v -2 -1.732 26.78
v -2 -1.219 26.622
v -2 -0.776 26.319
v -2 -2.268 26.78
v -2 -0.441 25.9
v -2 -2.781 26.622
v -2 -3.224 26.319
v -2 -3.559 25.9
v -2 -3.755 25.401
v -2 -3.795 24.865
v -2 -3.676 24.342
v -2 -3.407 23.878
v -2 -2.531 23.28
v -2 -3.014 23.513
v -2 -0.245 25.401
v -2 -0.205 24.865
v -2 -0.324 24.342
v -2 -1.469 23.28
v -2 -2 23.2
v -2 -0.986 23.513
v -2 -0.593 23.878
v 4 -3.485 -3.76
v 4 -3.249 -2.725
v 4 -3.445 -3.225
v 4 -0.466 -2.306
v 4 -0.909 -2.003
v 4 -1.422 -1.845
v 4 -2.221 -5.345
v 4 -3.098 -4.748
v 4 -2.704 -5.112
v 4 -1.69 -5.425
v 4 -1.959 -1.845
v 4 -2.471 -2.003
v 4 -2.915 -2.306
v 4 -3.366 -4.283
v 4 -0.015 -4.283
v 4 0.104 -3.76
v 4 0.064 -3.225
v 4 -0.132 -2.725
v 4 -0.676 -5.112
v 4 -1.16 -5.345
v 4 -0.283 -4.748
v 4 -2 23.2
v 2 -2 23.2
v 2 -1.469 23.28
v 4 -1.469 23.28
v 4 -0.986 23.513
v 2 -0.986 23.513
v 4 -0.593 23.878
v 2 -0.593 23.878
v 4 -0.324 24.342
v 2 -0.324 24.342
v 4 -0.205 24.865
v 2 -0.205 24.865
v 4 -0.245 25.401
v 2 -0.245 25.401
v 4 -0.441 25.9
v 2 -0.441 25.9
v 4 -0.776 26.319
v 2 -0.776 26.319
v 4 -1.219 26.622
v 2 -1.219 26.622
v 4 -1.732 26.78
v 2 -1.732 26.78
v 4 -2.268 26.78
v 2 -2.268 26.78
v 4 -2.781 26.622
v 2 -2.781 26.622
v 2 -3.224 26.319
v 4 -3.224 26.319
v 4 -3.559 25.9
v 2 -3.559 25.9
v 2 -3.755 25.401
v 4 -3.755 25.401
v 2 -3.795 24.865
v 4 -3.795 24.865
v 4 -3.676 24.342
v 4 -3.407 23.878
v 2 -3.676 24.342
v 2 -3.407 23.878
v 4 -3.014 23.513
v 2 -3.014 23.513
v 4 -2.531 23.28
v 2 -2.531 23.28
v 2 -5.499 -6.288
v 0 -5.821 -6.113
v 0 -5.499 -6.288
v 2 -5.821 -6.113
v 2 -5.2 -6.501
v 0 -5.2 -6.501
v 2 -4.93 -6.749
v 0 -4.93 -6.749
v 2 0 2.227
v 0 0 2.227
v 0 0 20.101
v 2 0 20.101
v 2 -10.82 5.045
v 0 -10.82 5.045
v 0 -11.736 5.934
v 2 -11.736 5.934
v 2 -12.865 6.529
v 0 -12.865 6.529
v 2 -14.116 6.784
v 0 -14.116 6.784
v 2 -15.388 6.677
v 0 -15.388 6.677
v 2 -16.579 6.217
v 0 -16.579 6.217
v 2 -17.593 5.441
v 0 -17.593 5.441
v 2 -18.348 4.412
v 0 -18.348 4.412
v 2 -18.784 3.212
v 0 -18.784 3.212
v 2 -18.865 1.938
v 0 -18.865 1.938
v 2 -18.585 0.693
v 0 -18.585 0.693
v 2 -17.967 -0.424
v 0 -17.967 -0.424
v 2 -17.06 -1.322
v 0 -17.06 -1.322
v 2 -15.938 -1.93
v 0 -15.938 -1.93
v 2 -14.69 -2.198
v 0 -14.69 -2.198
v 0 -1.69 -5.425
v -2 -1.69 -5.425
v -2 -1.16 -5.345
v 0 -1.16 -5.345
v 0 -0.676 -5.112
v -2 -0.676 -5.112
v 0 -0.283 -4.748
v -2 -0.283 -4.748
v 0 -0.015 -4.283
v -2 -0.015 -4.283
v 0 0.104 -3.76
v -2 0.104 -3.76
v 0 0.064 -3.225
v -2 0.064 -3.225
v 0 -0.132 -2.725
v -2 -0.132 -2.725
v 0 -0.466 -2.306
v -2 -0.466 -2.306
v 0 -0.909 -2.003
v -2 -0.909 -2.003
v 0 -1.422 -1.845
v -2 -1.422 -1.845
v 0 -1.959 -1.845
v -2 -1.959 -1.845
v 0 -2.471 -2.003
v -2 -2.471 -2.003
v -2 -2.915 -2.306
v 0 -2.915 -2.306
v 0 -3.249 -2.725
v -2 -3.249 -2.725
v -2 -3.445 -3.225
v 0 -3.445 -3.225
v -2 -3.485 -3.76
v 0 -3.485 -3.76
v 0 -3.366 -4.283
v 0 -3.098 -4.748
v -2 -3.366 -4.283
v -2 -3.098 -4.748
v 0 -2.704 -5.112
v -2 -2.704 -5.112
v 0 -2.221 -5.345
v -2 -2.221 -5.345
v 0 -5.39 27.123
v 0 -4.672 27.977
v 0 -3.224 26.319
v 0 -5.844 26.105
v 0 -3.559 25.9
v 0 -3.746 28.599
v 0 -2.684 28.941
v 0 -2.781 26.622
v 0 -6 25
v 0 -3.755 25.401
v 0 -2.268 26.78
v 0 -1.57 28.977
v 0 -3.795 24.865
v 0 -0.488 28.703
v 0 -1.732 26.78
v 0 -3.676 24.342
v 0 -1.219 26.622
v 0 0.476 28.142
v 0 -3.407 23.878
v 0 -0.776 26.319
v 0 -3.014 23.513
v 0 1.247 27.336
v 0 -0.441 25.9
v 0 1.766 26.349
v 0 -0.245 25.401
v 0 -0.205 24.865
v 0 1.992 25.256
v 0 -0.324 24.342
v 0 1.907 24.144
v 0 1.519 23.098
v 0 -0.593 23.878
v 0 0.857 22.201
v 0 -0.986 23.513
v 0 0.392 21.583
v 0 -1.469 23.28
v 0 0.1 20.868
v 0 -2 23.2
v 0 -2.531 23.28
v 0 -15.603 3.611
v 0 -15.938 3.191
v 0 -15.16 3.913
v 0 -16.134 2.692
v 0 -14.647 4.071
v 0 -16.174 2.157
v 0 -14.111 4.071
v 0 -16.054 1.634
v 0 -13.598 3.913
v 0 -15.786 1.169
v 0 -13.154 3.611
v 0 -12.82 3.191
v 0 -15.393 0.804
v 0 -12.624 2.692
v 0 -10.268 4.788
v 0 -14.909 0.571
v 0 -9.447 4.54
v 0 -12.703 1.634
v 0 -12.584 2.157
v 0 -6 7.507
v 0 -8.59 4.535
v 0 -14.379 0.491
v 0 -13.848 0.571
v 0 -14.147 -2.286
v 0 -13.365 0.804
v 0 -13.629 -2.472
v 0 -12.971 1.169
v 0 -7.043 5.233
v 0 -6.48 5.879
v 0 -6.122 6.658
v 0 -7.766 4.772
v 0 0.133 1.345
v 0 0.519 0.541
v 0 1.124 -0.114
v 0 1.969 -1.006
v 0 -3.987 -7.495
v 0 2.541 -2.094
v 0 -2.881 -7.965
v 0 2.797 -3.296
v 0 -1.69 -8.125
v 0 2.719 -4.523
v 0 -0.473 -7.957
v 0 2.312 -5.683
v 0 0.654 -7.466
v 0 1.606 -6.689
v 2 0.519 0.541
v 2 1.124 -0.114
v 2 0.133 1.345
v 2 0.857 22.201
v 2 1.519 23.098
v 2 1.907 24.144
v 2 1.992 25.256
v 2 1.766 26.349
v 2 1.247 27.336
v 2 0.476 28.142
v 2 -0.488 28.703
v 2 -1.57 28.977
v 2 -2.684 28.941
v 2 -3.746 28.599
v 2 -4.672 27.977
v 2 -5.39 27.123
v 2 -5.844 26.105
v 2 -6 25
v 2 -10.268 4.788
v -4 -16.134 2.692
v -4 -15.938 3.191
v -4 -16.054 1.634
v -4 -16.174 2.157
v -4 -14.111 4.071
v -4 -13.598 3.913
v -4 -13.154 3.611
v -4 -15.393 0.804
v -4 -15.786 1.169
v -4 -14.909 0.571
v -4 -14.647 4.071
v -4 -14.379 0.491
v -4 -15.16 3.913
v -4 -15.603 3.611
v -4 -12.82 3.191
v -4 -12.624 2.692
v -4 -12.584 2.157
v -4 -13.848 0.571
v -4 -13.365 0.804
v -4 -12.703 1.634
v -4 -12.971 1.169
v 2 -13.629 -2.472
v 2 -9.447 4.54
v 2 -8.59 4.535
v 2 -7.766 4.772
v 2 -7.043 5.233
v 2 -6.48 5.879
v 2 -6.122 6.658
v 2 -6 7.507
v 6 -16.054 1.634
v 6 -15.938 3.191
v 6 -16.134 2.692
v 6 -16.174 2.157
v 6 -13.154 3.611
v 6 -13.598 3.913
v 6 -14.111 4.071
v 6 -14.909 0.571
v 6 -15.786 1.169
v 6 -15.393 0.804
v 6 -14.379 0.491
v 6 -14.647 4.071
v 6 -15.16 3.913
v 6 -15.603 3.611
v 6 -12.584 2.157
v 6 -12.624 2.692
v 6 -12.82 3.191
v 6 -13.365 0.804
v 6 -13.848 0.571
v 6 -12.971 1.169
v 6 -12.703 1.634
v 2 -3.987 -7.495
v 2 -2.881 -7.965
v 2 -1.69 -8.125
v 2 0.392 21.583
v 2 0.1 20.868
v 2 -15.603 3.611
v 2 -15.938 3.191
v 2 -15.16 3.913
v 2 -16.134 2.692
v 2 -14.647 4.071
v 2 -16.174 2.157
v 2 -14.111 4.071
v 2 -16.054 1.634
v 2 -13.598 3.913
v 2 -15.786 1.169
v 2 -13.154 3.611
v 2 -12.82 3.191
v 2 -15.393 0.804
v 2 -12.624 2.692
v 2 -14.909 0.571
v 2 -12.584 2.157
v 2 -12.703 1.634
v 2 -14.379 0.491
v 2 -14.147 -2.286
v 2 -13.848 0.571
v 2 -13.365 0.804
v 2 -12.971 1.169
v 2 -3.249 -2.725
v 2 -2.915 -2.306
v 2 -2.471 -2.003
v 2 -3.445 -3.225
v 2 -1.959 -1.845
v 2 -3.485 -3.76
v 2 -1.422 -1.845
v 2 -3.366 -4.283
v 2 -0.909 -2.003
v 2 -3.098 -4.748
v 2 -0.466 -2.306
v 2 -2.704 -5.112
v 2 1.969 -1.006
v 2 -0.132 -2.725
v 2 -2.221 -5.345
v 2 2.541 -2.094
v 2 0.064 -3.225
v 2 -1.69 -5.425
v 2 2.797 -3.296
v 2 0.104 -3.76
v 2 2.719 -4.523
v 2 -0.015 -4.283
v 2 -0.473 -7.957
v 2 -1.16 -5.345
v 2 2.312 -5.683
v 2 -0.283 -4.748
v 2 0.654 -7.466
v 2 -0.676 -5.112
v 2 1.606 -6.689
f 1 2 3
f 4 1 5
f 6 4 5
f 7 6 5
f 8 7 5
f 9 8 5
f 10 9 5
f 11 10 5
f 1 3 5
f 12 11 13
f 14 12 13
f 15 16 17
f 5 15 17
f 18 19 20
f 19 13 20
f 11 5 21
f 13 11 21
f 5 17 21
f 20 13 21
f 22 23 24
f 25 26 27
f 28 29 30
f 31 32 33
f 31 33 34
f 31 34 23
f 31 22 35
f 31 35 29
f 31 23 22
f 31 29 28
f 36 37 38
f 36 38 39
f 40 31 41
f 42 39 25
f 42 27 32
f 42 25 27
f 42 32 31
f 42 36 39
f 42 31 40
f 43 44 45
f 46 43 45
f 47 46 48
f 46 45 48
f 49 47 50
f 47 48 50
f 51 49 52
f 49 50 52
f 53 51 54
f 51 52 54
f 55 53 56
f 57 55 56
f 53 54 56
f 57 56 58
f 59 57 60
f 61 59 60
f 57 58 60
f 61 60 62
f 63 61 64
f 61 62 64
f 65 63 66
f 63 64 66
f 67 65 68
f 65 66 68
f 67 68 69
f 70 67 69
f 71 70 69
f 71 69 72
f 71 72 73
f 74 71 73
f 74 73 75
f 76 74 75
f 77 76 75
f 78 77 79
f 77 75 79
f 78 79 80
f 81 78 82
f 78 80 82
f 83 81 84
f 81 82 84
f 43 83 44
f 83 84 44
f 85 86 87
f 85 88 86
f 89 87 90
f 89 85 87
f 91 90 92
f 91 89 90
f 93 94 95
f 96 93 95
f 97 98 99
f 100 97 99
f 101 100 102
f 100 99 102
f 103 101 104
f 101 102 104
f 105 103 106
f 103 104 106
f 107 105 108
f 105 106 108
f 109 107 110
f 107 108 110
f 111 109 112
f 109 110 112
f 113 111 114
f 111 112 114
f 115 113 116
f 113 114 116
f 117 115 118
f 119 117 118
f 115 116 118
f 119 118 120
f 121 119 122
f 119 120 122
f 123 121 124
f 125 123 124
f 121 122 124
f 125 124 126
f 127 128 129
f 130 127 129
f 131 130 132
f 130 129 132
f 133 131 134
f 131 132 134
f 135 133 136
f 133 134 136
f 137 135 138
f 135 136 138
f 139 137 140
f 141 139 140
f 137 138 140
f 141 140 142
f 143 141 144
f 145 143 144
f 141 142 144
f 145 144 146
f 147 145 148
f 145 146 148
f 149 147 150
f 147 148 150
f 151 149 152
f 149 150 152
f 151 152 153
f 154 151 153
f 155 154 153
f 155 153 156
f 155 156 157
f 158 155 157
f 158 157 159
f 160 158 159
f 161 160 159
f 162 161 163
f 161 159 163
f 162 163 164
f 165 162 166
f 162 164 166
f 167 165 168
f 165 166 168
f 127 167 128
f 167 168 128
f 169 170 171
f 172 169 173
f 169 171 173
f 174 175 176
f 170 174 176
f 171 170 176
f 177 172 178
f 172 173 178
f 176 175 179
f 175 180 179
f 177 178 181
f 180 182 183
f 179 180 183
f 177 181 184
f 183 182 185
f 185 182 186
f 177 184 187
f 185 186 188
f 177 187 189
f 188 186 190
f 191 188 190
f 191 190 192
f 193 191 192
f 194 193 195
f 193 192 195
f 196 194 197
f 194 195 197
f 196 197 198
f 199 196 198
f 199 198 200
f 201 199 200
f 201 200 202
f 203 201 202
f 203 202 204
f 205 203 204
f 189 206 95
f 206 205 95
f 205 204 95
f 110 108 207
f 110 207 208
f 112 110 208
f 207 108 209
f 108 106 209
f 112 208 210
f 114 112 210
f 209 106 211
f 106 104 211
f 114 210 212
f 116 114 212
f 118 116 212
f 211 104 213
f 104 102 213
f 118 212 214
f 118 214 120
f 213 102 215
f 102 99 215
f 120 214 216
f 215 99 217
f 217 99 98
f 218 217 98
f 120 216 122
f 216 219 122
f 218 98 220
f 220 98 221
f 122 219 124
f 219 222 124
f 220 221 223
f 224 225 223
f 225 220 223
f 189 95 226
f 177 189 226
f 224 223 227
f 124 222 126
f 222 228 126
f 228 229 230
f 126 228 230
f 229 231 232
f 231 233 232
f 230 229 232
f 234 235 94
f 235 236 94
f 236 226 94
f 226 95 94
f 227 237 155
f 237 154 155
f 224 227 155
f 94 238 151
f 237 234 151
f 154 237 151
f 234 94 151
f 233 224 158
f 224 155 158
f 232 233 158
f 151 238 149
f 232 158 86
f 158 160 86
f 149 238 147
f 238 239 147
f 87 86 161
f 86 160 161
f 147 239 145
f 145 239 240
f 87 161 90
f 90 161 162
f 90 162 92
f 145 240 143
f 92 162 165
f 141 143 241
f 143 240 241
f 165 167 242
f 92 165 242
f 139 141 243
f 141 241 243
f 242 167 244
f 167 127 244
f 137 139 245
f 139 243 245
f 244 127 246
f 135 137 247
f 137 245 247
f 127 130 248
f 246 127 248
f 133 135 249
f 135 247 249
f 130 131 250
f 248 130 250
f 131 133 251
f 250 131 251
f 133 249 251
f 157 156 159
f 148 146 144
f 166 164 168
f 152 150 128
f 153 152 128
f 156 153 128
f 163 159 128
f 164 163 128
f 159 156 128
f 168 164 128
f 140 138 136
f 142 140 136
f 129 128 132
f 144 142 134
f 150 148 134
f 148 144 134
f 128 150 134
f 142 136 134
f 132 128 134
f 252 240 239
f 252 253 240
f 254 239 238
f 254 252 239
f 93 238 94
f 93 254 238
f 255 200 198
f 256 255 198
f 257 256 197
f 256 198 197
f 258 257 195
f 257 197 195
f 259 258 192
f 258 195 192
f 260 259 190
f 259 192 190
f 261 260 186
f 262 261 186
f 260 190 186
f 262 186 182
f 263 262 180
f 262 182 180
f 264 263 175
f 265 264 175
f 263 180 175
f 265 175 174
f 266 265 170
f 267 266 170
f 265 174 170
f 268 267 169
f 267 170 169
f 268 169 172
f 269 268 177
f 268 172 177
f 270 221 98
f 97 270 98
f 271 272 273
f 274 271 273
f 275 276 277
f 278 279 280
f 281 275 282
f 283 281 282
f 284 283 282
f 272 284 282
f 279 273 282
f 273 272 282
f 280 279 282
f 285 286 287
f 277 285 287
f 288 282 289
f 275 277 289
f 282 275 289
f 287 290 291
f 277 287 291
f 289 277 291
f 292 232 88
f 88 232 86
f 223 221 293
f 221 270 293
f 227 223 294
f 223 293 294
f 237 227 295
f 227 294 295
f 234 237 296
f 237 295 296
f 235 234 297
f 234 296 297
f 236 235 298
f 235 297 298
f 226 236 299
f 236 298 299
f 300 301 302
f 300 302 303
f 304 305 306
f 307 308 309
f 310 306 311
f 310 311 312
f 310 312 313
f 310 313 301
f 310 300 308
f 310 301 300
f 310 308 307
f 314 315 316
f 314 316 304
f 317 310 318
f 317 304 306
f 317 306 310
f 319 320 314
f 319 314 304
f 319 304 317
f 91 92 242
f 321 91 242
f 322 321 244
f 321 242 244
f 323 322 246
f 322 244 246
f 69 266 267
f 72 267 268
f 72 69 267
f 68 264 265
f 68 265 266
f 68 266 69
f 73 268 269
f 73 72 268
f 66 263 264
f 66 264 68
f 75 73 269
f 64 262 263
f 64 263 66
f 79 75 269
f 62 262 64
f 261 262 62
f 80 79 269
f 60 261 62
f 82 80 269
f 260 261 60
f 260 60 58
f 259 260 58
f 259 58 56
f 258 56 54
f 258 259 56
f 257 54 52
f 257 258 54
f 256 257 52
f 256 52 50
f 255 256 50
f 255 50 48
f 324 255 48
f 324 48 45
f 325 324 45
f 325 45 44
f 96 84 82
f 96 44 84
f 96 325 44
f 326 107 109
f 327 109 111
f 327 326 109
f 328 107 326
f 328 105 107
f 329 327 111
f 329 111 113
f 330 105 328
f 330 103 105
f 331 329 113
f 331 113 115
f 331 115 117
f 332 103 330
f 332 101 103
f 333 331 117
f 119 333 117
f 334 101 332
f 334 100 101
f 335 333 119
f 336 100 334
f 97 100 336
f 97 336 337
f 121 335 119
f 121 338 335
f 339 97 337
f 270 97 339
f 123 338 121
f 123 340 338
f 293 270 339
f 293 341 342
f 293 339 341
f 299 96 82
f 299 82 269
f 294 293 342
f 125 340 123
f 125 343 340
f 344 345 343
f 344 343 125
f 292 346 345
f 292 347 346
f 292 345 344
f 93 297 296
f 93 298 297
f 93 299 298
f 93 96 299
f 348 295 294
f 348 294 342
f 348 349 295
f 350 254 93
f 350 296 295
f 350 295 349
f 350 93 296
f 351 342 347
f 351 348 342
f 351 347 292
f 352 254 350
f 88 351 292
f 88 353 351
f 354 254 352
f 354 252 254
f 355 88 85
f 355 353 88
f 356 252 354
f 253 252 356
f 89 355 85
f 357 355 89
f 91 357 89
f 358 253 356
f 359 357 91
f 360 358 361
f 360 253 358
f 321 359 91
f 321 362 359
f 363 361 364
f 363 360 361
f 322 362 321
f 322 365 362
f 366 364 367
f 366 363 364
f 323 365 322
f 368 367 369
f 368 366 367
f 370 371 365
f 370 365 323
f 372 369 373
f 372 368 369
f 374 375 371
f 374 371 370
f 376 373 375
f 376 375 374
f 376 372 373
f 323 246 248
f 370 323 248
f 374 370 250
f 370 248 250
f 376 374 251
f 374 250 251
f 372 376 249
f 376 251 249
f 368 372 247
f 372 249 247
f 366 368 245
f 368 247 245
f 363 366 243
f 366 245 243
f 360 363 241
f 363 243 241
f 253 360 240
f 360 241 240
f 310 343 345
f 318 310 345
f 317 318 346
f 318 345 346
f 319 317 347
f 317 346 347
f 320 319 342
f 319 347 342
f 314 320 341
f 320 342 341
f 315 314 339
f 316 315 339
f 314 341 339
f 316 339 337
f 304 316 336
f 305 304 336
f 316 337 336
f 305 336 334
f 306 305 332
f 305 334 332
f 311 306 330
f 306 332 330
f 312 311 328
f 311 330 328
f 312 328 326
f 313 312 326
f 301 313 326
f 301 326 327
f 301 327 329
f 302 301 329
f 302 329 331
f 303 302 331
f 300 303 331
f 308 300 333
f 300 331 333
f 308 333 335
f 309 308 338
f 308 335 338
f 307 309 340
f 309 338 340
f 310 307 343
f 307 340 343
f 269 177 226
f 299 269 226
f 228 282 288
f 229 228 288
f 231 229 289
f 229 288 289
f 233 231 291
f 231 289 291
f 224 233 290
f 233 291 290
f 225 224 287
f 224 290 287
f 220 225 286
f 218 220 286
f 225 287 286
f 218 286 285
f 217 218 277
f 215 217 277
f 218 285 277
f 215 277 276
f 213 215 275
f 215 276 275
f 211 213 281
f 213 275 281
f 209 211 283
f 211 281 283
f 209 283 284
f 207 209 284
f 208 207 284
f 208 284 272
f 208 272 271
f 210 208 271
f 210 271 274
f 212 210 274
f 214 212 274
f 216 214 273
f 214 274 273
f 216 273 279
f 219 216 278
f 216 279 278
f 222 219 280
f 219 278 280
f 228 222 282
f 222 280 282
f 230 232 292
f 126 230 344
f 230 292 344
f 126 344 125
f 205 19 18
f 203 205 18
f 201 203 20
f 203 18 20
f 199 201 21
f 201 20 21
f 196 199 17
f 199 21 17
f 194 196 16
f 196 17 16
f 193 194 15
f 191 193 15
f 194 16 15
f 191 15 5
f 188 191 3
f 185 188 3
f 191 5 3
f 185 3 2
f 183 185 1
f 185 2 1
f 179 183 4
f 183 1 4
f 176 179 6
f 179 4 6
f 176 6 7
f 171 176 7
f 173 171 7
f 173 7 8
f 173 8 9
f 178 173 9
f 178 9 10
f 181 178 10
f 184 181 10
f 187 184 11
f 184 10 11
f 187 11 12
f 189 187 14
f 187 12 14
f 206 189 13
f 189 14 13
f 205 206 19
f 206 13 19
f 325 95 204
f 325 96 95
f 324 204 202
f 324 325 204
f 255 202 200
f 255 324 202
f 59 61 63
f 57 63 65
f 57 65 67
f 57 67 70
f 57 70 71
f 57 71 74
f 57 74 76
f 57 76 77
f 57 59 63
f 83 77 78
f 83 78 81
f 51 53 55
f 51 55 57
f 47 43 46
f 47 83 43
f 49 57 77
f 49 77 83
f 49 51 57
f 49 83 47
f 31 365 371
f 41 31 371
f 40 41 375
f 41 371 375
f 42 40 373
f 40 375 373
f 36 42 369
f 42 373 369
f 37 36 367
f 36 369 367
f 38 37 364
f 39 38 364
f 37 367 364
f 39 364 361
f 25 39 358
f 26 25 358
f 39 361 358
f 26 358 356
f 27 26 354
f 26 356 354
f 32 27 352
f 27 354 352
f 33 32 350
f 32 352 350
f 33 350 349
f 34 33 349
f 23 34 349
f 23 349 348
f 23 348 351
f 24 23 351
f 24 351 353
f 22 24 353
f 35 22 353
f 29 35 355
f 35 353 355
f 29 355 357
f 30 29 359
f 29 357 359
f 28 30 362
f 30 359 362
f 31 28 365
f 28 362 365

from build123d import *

# Parameters (mm, degrees)
EXTRUDE_1_DEPTH     = 2
SKETCH_1_3_R        = 2
CUT_EXTRUDE_1_DEPTH = 35.66133887
FILLET_1_R          = 3
EXTRUDE_START       = -2
SKETCH_2_R          = 2
EXTRUDE_2_DEPTH     = 2
SKETCH_2_5_R        = 1.8
EXTRUDE_5_DEPTH     = 2
EXTRUDE_START_2     = -4
SKETCH_2_6_R        = 1.8
EXTRUDE_6_DEPTH     = 2
SKETCH_2_7_R        = 1.8
EXTRUDE_7_DEPTH     = 4
EXTRUDE_START_3     = -6
SKETCH_2_8_R        = 1.8
EXTRUDE_8_DEPTH     = 4


with BuildPart() as part:
    # 草图1 → 凸台-拉伸1 (new body)
    with BuildSketch(Plane(origin=(0, 0, 0), x_dir=(0, 0, -1), z_dir=(1, 0, 0))):
        with BuildLine():
            Line((-25, -6), (-25, 0))
            Line((-25, 0), (-21.535898385, 0))
            ThreePointArc((-21.535898385, 0), (-28.464101615, 0), (-25, -6))
        make_face()
        with BuildLine():
            Line((-21.535898385, 0), (-25, 0))
            Line((-25, 0), (-25, -6))
            ThreePointArc((-25, -6), (-22.171572875, -4.828427125), (-21, -2))
            ThreePointArc((-21, -2), (-21.136296695, -0.96472382), (-21.535898385, 0))
        make_face()
        with BuildLine():
            Line((-0.545176611, 0), (-21.535898385, 0))
            ThreePointArc((-21.535898385, 0), (-21.136296695, -0.96472382), (-21, -2))
            ThreePointArc((-21, -2), (-22.171572875, -4.828427125), (-25, -6))
            Line((-25, -6), (-2.797845949, -6))
            Line((-2.797845949, -6), (-0.871249866, -1.868401368))
            ThreePointArc((-0.871249866, -1.868401368), (-0.807766841, -0.916826597), (-0.545176611, 0))
        make_face()
        with BuildLine():
            ThreePointArc((8.125231148, -1.690473047), (4.486383017, 2.726360373), (-0.545176611, 0))
            Line((-0.545176611, 0), (0, 0))
            Line((0, 0), (7.250462296, -3.380946094))
            Line((7.250462296, -3.380946094), (6.37921243, -5.249347462))
            ThreePointArc((6.37921243, -5.249347462), (7.66521356, -3.67252807), (8.125231148, -1.690473047))
        make_face()
        with BuildLine():
            Line((0, 0), (-0.545176611, 0))
            ThreePointArc((-0.545176611, 0), (-0.807766841, -0.916826597), (-0.871249866, -1.868401368))
            Line((-0.871249866, -1.868401368), (0, 0))
        make_face()
        with BuildLine():
            Line((-0.871249866, -1.868401368), (-2.797845949, -6))
            Line((-2.797845949, -6), (0, -6))
            Line((0, -6), (0, -4.356499889))
            ThreePointArc((0, -4.356499889), (-0.621910323, -3.177681615), (-0.871249866, -1.868401368))
        make_face()
        with BuildLine():
            Line((0, -6), (-2.797845949, -6))
            Line((-2.797845949, -6), (-5.045405798, -10.819907651))
            ThreePointArc((-5.045405798, -10.819907651), (-0.389642338, -10.300397024), (2.205056498, -14.200853745))
            Line((2.205056498, -14.200853745), (6.37921243, -5.249347462))
            ThreePointArc((6.37921243, -5.249347462), (3.001481776, -6.147034134), (0, -4.356499889))
            Line((0, -4.356499889), (0, -6))
        make_face()
        with BuildLine():
            Line((7.250462296, -3.380946094), (0, 0))
            Line((0, 0), (0, -4.356499889))
            ThreePointArc((0, -4.356499889), (3.001481776, -6.147034134), (6.37921243, -5.249347462))
            Line((6.37921243, -5.249347462), (7.250462296, -3.380946094))
        make_face()
        with BuildLine():
            Line((0, -4.356499889), (0, 0))
            Line((0, 0), (-0.871249866, -1.868401368))
            ThreePointArc((-0.871249866, -1.868401368), (-0.621910323, -3.177681615), (0, -4.356499889))
        make_face()
        with BuildLine():
            ThreePointArc((2.205056498, -14.200853745), (-0.389642338, -10.300397024), (-5.045405798, -10.819907651))
            Line((-5.045405798, -10.819907651), (-5.916655664, -12.688309019))
            Line((-5.916655664, -12.688309019), (1.333806632, -16.069255112))
            Line((1.333806632, -16.069255112), (2.205056498, -14.200853745))
        make_face()
        with BuildLine():
            Line((-5.916655664, -12.688309019), (-5.045405798, -10.819907651))
            ThreePointArc((-5.045405798, -10.819907651), (-4.27347954, -18.418764477), (2.208575484, -14.378782065))
            ThreePointArc((2.208575484, -14.378782065), (2.207695651, -14.289800508), (2.205056498, -14.200853745))
            Line((2.205056498, -14.200853745), (1.333806632, -16.069255112))
            Line((1.333806632, -16.069255112), (-5.916655664, -12.688309019))
        make_face()
    extrude(amount=EXTRUDE_1_DEPTH)

    # 草图1<3> → 切除-拉伸1 (cut, through all)
    with BuildSketch(Plane(origin=(0, 0, 0), x_dir=(0, 0, -1), z_dir=(1, 0, 0))):
        with Locations((-25, -2)):
            Circle(SKETCH_1_3_R)
        with Locations((3.625231148, -1.690473047)):
            Circle(SKETCH_1_3_R)
        with Locations((-2.291424516, -14.378782065)):
            Circle(SKETCH_1_3_R)
    extrude(amount=CUT_EXTRUDE_1_DEPTH, mode=Mode.SUBTRACT)

    # 圆角1
    fillet_1_edges = [part.edges().sort_by_distance(p)[0] for p in [
        (1, -6, 2.797845949),
        (1, 0, 0.545176611),
        (1, -5.249347462, -6.37921243),
        (1, -14.200853745, -2.205056498),
        (1, 0, 21.535898385),
    ]]
    fillet(fillet_1_edges, radius=FILLET_1_R)

    # 草图2 → 凸台-拉伸2 (add)
    with BuildSketch(Plane(origin=(2, 0, 0), x_dir=(0, 0, -1), z_dir=(1, 0, 0)).offset(EXTRUDE_START)):
        with Locations((3.625231148, -1.690473047)):
            Circle(SKETCH_2_R)
        with Locations((-2.291424516, -14.378782065)):
            Circle(SKETCH_2_R)
        with Locations((-25, -2)):
            Circle(SKETCH_2_R)
    extrude(amount=EXTRUDE_2_DEPTH)

    # 草图2<5> → 凸台-拉伸5 (add)
    with BuildSketch(Plane(origin=(2, 0, 0), x_dir=(0, 0, -1), z_dir=(1, 0, 0))):
        with Locations((-25, -2)):
            Circle(SKETCH_2_5_R)
        with Locations((3.625231148, -1.690473047)):
            Circle(SKETCH_2_5_R)
    extrude(amount=EXTRUDE_5_DEPTH)

    # 草图2<6> → 凸台-拉伸6 (add)
    with BuildSketch(Plane(origin=(2, 0, 0), x_dir=(0, 0, -1), z_dir=(1, 0, 0)).offset(EXTRUDE_START_2)):
        with Locations((-25, -2)):
            Circle(SKETCH_2_6_R)
        with Locations((3.625231148, -1.690473047)):
            Circle(SKETCH_2_6_R)
    extrude(amount=EXTRUDE_6_DEPTH)

    # 草图2<7> → 凸台-拉伸7 (add)
    with BuildSketch(Plane(origin=(2, 0, 0), x_dir=(0, 0, -1), z_dir=(1, 0, 0))):
        with Locations((-2.291424516, -14.378782065)):
            Circle(SKETCH_2_7_R)
    extrude(amount=EXTRUDE_7_DEPTH)

    # 草图2<8> → 凸台-拉伸8 (add)
    with BuildSketch(Plane(origin=(2, 0, 0), x_dir=(0, 0, -1), z_dir=(1, 0, 0)).offset(EXTRUDE_START_3)):
        with Locations((-2.291424516, -14.378782065)):
            Circle(SKETCH_2_8_R)
    extrude(amount=EXTRUDE_8_DEPTH)


solid = part.part
